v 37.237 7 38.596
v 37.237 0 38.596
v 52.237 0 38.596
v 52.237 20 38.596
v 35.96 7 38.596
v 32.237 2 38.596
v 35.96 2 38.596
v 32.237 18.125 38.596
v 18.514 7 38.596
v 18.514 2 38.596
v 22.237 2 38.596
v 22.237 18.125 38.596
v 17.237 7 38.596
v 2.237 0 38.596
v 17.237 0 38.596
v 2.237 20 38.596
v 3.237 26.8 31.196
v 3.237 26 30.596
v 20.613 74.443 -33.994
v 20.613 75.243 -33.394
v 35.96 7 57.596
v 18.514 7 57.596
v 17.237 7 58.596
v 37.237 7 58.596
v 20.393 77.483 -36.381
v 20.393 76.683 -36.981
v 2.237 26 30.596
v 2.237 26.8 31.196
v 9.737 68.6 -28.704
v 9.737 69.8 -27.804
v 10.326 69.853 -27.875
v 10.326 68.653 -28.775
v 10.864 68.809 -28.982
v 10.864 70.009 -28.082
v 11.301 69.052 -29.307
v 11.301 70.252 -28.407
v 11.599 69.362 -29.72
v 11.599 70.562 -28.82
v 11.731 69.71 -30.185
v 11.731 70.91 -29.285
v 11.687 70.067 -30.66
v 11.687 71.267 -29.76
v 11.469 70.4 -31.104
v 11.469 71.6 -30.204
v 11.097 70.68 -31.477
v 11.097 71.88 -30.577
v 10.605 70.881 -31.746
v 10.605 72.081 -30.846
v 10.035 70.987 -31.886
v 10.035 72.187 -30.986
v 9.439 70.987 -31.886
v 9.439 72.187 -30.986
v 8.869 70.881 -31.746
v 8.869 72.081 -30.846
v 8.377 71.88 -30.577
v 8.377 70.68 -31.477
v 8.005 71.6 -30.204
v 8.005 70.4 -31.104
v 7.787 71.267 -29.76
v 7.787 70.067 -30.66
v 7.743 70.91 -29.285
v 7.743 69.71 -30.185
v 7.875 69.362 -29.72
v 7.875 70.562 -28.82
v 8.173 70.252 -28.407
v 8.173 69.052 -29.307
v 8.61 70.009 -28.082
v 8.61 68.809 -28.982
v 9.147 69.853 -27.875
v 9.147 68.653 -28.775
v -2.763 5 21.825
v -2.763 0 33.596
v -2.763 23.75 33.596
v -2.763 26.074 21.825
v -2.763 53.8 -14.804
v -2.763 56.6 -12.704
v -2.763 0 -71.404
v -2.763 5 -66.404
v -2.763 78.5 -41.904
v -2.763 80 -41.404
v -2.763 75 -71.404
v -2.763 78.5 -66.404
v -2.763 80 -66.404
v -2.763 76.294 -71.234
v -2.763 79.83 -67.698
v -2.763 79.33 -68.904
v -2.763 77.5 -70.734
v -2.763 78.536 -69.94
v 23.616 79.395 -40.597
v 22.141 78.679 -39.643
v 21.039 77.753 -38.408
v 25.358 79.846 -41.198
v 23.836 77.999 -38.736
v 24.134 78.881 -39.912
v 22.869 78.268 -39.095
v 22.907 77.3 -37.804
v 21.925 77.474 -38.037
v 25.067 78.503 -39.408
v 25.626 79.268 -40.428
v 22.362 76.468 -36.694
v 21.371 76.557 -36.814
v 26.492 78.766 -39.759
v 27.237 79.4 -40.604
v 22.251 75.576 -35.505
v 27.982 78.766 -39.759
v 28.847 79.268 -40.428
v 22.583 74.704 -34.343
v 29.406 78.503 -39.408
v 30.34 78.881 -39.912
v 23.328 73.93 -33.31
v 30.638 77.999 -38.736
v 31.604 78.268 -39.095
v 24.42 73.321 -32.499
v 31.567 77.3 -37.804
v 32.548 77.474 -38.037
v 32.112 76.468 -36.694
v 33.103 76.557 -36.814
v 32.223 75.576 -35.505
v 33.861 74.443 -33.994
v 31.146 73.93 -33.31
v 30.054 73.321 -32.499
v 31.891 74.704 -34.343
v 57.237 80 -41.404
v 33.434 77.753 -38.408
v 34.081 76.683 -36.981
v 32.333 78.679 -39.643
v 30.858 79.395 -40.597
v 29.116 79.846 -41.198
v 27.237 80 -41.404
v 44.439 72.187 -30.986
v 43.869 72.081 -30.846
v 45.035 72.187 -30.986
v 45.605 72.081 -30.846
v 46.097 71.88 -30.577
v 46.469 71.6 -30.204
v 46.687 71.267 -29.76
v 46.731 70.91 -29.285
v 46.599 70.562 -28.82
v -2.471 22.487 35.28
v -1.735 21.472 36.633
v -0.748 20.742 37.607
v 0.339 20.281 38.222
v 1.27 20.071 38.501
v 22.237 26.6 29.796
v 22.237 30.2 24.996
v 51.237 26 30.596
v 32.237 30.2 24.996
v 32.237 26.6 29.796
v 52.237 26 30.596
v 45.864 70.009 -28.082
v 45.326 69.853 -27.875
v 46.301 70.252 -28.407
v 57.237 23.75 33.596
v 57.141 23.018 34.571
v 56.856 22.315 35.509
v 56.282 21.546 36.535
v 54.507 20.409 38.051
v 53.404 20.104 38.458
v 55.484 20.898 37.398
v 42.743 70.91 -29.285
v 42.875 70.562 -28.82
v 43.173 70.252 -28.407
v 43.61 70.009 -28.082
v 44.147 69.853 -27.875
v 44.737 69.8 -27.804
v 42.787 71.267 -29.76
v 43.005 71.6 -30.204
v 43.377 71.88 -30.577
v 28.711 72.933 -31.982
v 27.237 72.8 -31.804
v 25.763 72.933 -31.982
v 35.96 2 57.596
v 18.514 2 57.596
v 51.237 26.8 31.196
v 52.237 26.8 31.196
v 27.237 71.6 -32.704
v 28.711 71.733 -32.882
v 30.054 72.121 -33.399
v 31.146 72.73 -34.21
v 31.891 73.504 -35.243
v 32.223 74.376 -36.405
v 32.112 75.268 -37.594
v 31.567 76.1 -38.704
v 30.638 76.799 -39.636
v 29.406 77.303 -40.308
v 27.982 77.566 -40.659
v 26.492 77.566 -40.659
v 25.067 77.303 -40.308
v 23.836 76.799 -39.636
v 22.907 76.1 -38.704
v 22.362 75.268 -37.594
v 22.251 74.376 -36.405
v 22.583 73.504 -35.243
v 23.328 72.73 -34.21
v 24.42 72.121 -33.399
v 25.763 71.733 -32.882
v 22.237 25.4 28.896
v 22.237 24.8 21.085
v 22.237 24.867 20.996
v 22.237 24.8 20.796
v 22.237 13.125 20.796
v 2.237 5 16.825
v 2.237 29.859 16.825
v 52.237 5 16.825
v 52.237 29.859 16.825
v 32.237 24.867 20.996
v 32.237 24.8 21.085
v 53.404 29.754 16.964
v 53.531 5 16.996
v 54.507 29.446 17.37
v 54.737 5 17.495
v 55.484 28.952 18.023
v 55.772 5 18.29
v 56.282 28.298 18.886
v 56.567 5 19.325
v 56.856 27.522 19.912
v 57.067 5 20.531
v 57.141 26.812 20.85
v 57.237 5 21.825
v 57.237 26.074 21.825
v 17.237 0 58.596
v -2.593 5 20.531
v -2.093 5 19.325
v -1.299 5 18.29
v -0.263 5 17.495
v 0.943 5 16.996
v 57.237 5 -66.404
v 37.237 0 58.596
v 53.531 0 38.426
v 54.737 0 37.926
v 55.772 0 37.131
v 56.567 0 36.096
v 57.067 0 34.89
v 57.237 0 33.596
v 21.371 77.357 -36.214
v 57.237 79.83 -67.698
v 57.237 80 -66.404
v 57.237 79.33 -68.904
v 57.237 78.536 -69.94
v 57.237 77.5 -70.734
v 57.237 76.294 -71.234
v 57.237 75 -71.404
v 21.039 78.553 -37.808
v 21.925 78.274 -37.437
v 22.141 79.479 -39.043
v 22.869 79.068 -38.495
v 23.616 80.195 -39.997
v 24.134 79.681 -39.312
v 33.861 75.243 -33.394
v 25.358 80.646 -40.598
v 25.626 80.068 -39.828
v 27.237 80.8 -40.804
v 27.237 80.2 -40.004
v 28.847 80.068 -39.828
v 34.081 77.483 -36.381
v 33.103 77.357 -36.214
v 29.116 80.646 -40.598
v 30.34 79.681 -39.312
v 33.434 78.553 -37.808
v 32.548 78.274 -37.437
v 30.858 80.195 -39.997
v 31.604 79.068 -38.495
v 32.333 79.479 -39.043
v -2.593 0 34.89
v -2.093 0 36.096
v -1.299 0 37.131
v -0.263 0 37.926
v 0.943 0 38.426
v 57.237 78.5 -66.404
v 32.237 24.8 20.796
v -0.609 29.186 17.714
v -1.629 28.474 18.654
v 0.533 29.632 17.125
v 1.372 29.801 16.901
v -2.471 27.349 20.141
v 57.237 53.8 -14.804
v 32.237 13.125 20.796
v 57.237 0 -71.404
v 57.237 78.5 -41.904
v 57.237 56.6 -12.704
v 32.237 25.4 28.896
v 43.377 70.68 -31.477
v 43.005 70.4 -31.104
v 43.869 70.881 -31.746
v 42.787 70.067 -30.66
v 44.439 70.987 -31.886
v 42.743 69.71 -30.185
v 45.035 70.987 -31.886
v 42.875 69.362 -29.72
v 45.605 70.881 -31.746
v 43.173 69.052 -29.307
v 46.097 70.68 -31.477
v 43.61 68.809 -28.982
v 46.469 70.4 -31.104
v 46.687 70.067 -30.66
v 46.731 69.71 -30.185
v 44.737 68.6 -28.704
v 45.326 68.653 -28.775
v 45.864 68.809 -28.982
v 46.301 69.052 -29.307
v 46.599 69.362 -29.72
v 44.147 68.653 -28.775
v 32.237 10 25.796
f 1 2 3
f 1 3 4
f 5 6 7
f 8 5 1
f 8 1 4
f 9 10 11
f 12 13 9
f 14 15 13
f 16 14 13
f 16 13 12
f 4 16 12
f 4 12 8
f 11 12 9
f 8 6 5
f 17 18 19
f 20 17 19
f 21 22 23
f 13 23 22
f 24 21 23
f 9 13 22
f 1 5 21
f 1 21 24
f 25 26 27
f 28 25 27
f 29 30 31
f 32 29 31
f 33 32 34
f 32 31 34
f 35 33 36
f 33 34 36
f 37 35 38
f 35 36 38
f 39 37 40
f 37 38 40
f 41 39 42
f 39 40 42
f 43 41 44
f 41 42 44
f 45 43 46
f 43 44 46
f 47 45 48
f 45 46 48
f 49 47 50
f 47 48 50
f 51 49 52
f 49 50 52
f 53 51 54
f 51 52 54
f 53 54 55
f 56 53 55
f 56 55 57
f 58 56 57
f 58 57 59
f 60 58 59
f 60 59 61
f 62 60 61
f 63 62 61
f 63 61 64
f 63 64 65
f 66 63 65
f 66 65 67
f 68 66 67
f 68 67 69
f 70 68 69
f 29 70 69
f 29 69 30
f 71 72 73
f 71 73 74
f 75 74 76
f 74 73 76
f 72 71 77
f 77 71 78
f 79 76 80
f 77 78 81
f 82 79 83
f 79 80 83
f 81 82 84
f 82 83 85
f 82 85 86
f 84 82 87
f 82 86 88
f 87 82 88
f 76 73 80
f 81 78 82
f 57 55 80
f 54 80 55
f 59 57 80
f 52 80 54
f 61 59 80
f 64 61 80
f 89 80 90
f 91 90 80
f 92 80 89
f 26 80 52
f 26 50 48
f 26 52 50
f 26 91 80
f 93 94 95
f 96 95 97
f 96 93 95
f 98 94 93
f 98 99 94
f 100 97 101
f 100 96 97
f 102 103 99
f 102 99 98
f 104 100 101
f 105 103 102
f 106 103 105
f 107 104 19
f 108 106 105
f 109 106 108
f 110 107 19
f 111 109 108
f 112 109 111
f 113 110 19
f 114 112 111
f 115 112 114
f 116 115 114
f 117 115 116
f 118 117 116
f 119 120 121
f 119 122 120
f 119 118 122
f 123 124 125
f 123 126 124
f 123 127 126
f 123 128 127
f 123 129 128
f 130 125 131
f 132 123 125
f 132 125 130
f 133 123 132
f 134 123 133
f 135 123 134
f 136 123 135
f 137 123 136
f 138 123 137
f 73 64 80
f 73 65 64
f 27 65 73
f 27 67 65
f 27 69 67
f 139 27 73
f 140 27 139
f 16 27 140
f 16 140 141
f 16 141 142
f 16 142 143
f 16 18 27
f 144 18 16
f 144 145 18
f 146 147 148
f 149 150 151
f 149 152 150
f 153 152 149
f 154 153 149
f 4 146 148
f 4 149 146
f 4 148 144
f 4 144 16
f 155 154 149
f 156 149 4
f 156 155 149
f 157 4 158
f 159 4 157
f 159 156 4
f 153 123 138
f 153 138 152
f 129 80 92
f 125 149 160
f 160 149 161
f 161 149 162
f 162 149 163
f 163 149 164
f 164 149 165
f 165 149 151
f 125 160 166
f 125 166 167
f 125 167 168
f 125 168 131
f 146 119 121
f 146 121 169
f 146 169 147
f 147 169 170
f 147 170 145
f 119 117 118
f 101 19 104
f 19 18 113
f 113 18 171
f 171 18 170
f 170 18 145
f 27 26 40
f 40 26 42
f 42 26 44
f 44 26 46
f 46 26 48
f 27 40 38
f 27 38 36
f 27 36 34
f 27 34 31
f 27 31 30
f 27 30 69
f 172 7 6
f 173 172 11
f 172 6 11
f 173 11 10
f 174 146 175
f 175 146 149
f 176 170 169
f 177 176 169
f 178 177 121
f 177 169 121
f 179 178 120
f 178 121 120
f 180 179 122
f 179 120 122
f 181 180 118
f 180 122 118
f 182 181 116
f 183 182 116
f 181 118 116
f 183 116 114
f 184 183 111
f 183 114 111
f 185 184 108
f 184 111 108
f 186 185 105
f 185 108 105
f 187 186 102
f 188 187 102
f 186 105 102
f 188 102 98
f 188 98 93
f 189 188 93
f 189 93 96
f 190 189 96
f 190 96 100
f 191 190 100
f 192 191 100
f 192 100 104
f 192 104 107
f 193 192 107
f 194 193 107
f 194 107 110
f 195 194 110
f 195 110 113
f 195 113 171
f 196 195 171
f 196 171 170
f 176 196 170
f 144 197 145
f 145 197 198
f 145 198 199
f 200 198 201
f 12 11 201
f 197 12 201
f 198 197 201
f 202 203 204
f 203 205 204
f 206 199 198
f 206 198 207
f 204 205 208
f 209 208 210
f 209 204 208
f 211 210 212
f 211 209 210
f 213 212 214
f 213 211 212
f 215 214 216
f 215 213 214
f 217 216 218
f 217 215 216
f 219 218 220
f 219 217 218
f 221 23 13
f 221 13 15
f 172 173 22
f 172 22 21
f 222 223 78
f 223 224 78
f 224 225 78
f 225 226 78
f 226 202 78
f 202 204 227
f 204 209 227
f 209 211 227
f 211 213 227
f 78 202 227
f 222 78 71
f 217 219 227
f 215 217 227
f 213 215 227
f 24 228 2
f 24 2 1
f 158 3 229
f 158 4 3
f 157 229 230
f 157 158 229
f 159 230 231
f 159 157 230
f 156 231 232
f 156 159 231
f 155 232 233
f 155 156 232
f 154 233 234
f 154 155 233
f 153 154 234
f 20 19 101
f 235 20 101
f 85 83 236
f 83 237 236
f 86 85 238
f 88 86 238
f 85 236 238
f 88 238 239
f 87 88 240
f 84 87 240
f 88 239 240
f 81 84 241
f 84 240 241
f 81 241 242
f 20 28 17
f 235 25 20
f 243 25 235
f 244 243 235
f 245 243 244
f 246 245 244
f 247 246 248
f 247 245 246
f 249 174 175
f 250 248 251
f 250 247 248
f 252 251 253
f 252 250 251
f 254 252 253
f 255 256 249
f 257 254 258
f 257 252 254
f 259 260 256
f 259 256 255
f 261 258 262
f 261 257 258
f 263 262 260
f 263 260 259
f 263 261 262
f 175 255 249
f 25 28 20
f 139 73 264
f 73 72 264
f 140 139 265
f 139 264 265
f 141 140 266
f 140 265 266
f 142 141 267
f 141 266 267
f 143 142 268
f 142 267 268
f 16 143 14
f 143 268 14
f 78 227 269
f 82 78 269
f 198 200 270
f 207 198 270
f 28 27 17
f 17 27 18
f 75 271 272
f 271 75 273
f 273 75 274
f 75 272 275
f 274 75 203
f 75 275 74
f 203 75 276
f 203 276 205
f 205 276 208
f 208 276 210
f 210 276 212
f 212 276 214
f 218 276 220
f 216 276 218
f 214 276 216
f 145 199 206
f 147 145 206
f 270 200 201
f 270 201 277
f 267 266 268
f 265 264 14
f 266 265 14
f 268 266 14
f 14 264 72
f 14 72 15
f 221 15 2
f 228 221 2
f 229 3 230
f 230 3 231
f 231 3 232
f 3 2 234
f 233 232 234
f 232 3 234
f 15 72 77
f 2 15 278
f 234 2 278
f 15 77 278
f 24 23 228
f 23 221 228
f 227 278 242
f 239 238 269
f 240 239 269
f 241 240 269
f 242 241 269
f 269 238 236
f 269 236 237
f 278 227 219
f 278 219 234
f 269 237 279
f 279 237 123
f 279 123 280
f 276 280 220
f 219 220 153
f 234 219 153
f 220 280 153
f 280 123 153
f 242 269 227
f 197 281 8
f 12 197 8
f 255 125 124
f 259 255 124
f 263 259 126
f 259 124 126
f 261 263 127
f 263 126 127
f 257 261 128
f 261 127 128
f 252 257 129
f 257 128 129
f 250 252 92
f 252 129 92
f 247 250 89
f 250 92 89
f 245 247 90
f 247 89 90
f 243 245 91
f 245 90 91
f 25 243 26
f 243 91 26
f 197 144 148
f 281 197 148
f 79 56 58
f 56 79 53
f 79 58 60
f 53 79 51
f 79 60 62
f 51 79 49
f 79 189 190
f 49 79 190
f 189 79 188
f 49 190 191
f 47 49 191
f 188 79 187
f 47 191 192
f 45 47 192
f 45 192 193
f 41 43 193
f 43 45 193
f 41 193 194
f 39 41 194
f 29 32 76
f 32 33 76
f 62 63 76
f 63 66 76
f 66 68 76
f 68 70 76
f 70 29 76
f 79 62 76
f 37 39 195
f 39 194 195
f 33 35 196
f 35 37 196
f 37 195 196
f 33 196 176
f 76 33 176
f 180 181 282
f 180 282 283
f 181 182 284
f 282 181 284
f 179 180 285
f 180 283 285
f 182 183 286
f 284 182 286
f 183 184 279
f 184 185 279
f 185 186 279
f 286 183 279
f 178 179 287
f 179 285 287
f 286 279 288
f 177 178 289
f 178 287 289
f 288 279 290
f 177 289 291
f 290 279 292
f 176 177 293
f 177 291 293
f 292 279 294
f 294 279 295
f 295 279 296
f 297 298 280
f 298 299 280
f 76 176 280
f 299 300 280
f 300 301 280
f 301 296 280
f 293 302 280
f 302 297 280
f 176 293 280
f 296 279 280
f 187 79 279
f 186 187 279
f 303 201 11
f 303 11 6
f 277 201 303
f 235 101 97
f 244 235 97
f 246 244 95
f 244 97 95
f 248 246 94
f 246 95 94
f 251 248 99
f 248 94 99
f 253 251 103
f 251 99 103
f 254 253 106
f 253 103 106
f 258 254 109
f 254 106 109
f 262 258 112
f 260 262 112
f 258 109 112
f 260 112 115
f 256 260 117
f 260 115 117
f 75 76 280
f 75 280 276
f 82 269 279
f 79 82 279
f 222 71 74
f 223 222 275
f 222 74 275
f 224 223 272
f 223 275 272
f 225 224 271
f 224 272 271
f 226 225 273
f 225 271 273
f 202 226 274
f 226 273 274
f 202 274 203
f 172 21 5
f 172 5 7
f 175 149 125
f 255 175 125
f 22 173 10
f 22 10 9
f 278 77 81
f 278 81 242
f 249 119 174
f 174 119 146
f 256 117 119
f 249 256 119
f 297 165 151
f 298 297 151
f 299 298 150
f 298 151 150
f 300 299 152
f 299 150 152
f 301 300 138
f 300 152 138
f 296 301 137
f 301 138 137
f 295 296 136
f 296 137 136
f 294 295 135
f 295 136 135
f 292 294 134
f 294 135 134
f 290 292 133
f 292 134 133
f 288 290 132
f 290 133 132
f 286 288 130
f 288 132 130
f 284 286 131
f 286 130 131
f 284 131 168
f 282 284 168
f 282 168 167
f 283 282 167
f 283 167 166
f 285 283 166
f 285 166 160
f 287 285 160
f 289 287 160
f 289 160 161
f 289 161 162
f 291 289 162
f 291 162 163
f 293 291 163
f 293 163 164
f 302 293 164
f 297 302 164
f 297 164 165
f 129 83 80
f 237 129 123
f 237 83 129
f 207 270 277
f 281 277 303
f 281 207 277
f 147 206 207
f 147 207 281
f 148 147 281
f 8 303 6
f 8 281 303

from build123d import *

# Parameters (mm, degrees)
SKETCH2_W                = 120
SKETCH2_H                = 110
BOSS_EXTRUDE1_DEPTH      = 80
CUT_EXTRUDE1_DEPTH       = 161.930246459
SKETCH6_R                = 2
SKETCH6_W                = 10
SKETCH6_H                = 5
CUT_EXTRUDE4_DEPTH       = 14
CUT_EXTRUDE6_DEPTH       = 161.930246459
CUT_EXTRUDE8_DEPTH       = 120
BOSS_EXTRUDE11_DEPTH     = 55
BOSS_EXTRUDE12_DEPTH     = 55
SKETCH17_W               = 10
SKETCH17_H               = 5
BOSS_EXTRUDE13_DEPTH     = 7.333333
CUT_EXTRUDE9_DEPTH       = 161.930246459
BOSS_EXTRUDE14_DEPTH     = 20
SKETCH20_W               = 17.446322517
SKETCH20_H               = 1
BOSS_EXTRUDE15_DEPTH     = 5
BOSS_EXTRUDE16_DEPTH     = 1
CUT_EXTRUDE10_DEPTH      = 30
CUT_EXTRUDE12_DEPTH      = 30
FILLET1_R                = 5
FILLET2_R                = 5
FILLET3_R                = 5
CUT_EXTRUDE13_REACH      = 123.365
SKETCH25_R               = 5
CUT_EXTRUDE14_START      = -6.666667
SKETCH26_W               = 10
SKETCH26_H               = 6
CUT_EXTRUDE14_DEPTH      = 6.666667
SKETCH30_W               = 10
SKETCH30_H               = 14
CUT_EXTRUDE16_DEPTH      = 4
CUT_EXTRUDE18_DEPTH      = 2
CUT_EXTRUDE18_DEPTH_BACK = 1
SKETCH31_W               = 10
SKETCH31_H               = 14.8
SKETCH32_W               = 10
SKETCH32_H               = 7.905630189
BOSS_EXTRUDE18_DEPTH     = 5
CUT_EXTRUDE19_DEPTH      = 114.367474283
CUT_EXTRUDE19_DEPTH_BACK = 114.367474283


with BuildPart() as part:
    # Sketch2 → Boss-Extrude1 (new body)
    with BuildSketch(Plane(origin=(0, 0, 0), x_dir=(1, 0, 0), z_dir=(0, 1, 0))):
        with Locations((27.236913342, 16.404091096)):
            Rectangle(SKETCH2_W, SKETCH2_H)
    extrude(amount=BOSS_EXTRUDE1_DEPTH)

    # Sketch3 → Cut-Extrude1 (cut, through all)
    with BuildSketch(Plane(origin=(87.236913342, 0, 0), x_dir=(0, 0, -1), z_dir=(1, 0, 0))):
        Polygon((-38.595908904, 80), (41.404091096, 80), (-38.595908904, 20), align=None)
    extrude(amount=-CUT_EXTRUDE1_DEPTH, mode=Mode.SUBTRACT)

    # Sketch6 → Cut-Extrude4 (cut)
    with BuildSketch(Plane(origin=(0, 31.326036274, 23.494527206), x_dir=(1, 0, 0), z_dir=(0, 0.8, 0.6))):
        with Locations(Location((9.736913342, 66.123272877, 0), (0, 0, 270))):
            Circle(SKETCH6_R)
        with BuildLine():
            ThreePointArc((31.736913342, 74.123272877), (30.418893857, 77.305253392), (27.236913342, 78.623272877))
            Line((27.236913342, 78.623272877), (27.236913342, 69.623272877))
            ThreePointArc((27.236913342, 69.623272877), (30.418893857, 70.941292361), (31.736913342, 74.123272877))
        make_face()
        with BuildLine():
            Line((27.236913342, 69.623272877), (27.236913342, 78.623272877))
            ThreePointArc((27.236913342, 78.623272877), (22.736913342, 74.123272877), (27.236913342, 69.623272877))
        make_face()
        with Locations(Location((44.736913342, 66.123272877, 0), (0, 0, 270))):
            Circle(SKETCH6_R)
        with Locations((27.236913342, -5.376727123)):
            Rectangle(SKETCH6_W, SKETCH6_H)
    extrude(amount=-CUT_EXTRUDE4_DEPTH, mode=Mode.SUBTRACT)

    # Sketch8 → Cut-Extrude6 (cut, through all)
    with BuildSketch(Plane(origin=(87.236913342, 0, 0), x_dir=(0, 0, -1), z_dir=(1, 0, 0))):
        Polygon((41.904091096, 78.5), (12.704091096, 56.6), (51.404091096, 5), (66.404091096, 5), (66.404091096, 78.5), align=None)
    extrude(amount=-CUT_EXTRUDE6_DEPTH, mode=Mode.SUBTRACT)

    # Sketch12 → Cut-Extrude8 (cut)
    with BuildSketch(Plane(origin=(87.236913342, 0, 0), x_dir=(0, 0, -1), z_dir=(1, 0, 0))):
        Polygon((-25.795908904, 10), (-25.795908904, 27.725), (-38.595908904, 18.125), (-38.595908904, 2), align=None)
    extrude(amount=-CUT_EXTRUDE8_DEPTH, mode=Mode.SUBTRACT)

    # Sketch13 → Boss-Extrude11 (add)
    with BuildSketch(Plane(origin=(87.236913342, 0, 0), x_dir=(0, 0, -1), z_dir=(1, 0, 0))):
        Polygon((-38.595908904, 18.125), (-25.795908904, 27.725), (-25.795908904, 10), (-38.595908904, 2), align=None)
    extrude(amount=-BOSS_EXTRUDE11_DEPTH)

    # Sketch14 → Boss-Extrude12 (add)
    with BuildSketch(Plane.ZY.offset(32.763086658)):
        Polygon((38.595908904, 18.125), (25.795908904, 27.725), (25.795908904, 10), (38.595908904, 2), align=None)
    extrude(amount=-BOSS_EXTRUDE12_DEPTH)

    # Sketch17 → Boss-Extrude13 (add)
    with BuildSketch(Plane(origin=(0, 20.126036274, 15.094527206), x_dir=(1, 0, 0), z_dir=(0, 0.8000000000000005, 0.5999999999999995))):
        with Locations((27.236913342, -5.376727123)):
            Rectangle(SKETCH17_W, SKETCH17_H)
    extrude(amount=BOSS_EXTRUDE13_DEPTH)

    # Sketch18 → Cut-Extrude9 (cut, through all)
    with BuildSketch(Plane(origin=(87.236913342, 0, 0), x_dir=(0, 0, -1), z_dir=(1, 0, 0))):
        Polygon((51.404091096, 5), (14.804111641, 53.799972607), (-16.825372102, 29.858521527), (-16.825372102, 5), align=None)
    extrude(amount=-CUT_EXTRUDE9_DEPTH, mode=Mode.SUBTRACT)

    # Sketch19 → Boss-Extrude14 (add)
    with BuildSketch(Plane.XY.offset(38.595908904)):
        Polygon((17.236913342, 0), (37.236913342, 0), (37.236913342, 7), (35.9600746, 7), (35.9600746, 2), (18.513752083, 2), (18.513752083, 7), (17.236913342, 7), align=None)
    extrude(amount=BOSS_EXTRUDE14_DEPTH)

    # Sketch20 → Boss-Extrude15 (add)
    with BuildSketch(Plane(origin=(0, 2, 0), x_dir=(1, 0, 0), z_dir=(0, 1, 0))):
        with Locations((27.236913342, -58.095908904)):
            Rectangle(SKETCH20_W, SKETCH20_H)
    extrude(amount=BOSS_EXTRUDE15_DEPTH)

    # Sketch21 → Boss-Extrude16 (add)
    with BuildSketch(Plane(origin=(0, 31.326036274, 23.494527206), x_dir=(1, 0, 0), z_dir=(0, 0.8, 0.6))):
        with BuildLine():
            Line((20.612624354, 71.860797373), (21.371214726, 75.385643561))
            ThreePointArc((21.371214726, 75.385643561), (27.236913342, 80.123272877), (33.102611958, 75.385643561))
            Line((33.102611958, 75.385643561), (33.86120233, 71.860797373))
            ThreePointArc((33.86120233, 71.860797373), (34.142346815, 72.976543378), (34.236913342, 74.123272877))
            ThreePointArc((34.236913342, 74.123272877), (34.197727754, 74.862909761), (34.080609707, 75.594265758))
            ThreePointArc((34.080609707, 75.594265758), (27.236913342, 81.123272877), (20.393216976, 75.594265758))
            ThreePointArc((20.393216976, 75.594265758), (20.248969874, 73.71260746), (20.612624354, 71.860797373))
        make_face()
        with BuildLine():
            ThreePointArc((34.236913342, 74.123272877), (34.142346815, 72.976543378), (33.86120233, 71.860797373))
            Line((33.86120233, 71.860797373), (51.236913342, -8.876727123))
            Line((51.236913342, -8.876727123), (52.236913342, -8.876727123))
            Line((52.236913342, -8.876727123), (34.080609707, 75.594265758))
            ThreePointArc((34.080609707, 75.594265758), (34.197727754, 74.862909761), (34.236913342, 74.123272877))
        make_face()
        with BuildLine():
            Line((3.236913342, -8.876727123), (20.612624354, 71.860797373))
            ThreePointArc((20.612624354, 71.860797373), (20.248969874, 73.71260746), (20.393216976, 75.594265758))
            Line((20.393216976, 75.594265758), (2.236913342, -8.876727123))
            Line((2.236913342, -8.876727123), (3.236913342, -8.876727123))
        make_face()
    extrude(amount=BOSS_EXTRUDE16_DEPTH)

    # Sketch23 → Cut-Extrude10 (cut)
    with BuildSketch(Plane(origin=(87.236913342, 0, 0), x_dir=(0, 0, -1), z_dir=(1, 0, 0))):
        Polygon((-38.595908904, 0), (-38.595908904, 20), (41.404091096, 80), (71.404091096, 80), (71.404091096, 0), align=None)
    extrude(amount=-CUT_EXTRUDE10_DEPTH, mode=Mode.SUBTRACT)

    # Sketch24 → Cut-Extrude12 (cut)
    with BuildSketch(Plane.ZY.offset(32.763086658)):
        Polygon((-71.404091096, 80), (-41.404091096, 80), (38.595908904, 20), (38.595908904, 0), (-71.404091096, 0), align=None)
    extrude(amount=-CUT_EXTRUDE12_DEPTH, mode=Mode.SUBTRACT)

    # Fillet1
    fillet1_edges = [part.edges().sort_by_distance(p)[0] for p in [
        (27.236913342, 80, -71.404091096),
    ]]
    fillet(fillet1_edges, radius=FILLET1_R)

    # Fillet2
    fillet2_edges = [part.edges().sort_by_distance(p)[0] for p in [
        (57.236913342, 10, 38.595908904),
        (-2.763086658, 10, 38.595908904),
    ]]
    fillet(fillet2_edges, radius=FILLET2_R)

    # Fillet3
    fillet3_edges = [part.edges().sort_by_distance(p)[0] for p in [
        (57.236913342, 17.429260763, 16.825372102),
        (-2.763086658, 17.429260763, 16.825372102),
    ]]
    fillet(fillet3_edges, radius=FILLET3_R)

    # Sketch25 → Cut-Extrude13 (cut, up to next)
    with BuildSketch(Plane(origin=(0, 31.326036274, 23.494527206), x_dir=(1, 0, 0), z_dir=(0, 0.8, 0.6)), mode=Mode.PRIVATE) as cut_extrude13_sk1:
        with Locations(Location((27.236913342, 74.123272877, 0), (0, 0, 270))):
            Circle(SKETCH25_R)
    cut_extrude13_tool1 = extrude(cut_extrude13_sk1.sketch, amount=-CUT_EXTRUDE13_REACH, mode=Mode.PRIVATE) & part.part
    add(cut_extrude13_tool1.solids().sort_by_distance((27.236913, 75.8, -35.804091))[0], mode=Mode.SUBTRACT)

    # Sketch26 → Cut-Extrude14 (cut)
    with BuildSketch(Plane(origin=(0, 31.326036274, 23.494527206), x_dir=(1, 0, 0), z_dir=(0, 0.8, 0.6)).offset(CUT_EXTRUDE14_START)):
        with Locations((27.236913342, -4.876727123)):
            Rectangle(SKETCH26_W, SKETCH26_H)
    extrude(amount=CUT_EXTRUDE14_DEPTH, mode=Mode.SUBTRACT)

    # Sketch30 → Cut-Extrude16 (cut)
    with BuildSketch(Plane.XY.offset(25.795908904)):
        with Locations((27.236913342, 17)):
            Rectangle(SKETCH30_W, SKETCH30_H)
    extrude(amount=-CUT_EXTRUDE16_DEPTH, mode=Mode.SUBTRACT)

    # Sketch31 → Cut-Extrude18 (cut, two sides: drawn at the far end of the back side and taken through both)
    with BuildSketch(Plane.XY.offset(21.795908904).offset(-CUT_EXTRUDE18_DEPTH_BACK)):
        with Locations((27.236913342, 17.4)):
            Rectangle(SKETCH31_W, SKETCH31_H)
    extrude(amount=CUT_EXTRUDE18_DEPTH + CUT_EXTRUDE18_DEPTH_BACK, mode=Mode.SUBTRACT)

    # Sketch32 → Boss-Extrude18 (add)
    with BuildSketch(Plane(origin=(0, 18.784678159, 11.740423849), x_dir=(1, 0, 0), z_dir=(0, 0.8479983040050879, 0.5299989400031804))):
        with Locations((27.236913342, -12.622082506)):
            Rectangle(SKETCH32_W, SKETCH32_H)
    extrude(amount=-BOSS_EXTRUDE18_DEPTH)

    # Sketch36 → Cut-Extrude19 (cut, two sides: drawn at the far end of the back side and taken through both)
    with BuildSketch(Plane(origin=(32.236913342, 0, 0), x_dir=(0, 0, -1), z_dir=(1, 0, 0)).offset(-CUT_EXTRUDE19_DEPTH_BACK)):
        Polygon((-16.441953212, 9.9499841), (-16.825372102, 10.563454323), (-16.825372102, 9.710347294), align=None)
    extrude(amount=CUT_EXTRUDE19_DEPTH + CUT_EXTRUDE19_DEPTH_BACK, mode=Mode.SUBTRACT)


solid = part.part
